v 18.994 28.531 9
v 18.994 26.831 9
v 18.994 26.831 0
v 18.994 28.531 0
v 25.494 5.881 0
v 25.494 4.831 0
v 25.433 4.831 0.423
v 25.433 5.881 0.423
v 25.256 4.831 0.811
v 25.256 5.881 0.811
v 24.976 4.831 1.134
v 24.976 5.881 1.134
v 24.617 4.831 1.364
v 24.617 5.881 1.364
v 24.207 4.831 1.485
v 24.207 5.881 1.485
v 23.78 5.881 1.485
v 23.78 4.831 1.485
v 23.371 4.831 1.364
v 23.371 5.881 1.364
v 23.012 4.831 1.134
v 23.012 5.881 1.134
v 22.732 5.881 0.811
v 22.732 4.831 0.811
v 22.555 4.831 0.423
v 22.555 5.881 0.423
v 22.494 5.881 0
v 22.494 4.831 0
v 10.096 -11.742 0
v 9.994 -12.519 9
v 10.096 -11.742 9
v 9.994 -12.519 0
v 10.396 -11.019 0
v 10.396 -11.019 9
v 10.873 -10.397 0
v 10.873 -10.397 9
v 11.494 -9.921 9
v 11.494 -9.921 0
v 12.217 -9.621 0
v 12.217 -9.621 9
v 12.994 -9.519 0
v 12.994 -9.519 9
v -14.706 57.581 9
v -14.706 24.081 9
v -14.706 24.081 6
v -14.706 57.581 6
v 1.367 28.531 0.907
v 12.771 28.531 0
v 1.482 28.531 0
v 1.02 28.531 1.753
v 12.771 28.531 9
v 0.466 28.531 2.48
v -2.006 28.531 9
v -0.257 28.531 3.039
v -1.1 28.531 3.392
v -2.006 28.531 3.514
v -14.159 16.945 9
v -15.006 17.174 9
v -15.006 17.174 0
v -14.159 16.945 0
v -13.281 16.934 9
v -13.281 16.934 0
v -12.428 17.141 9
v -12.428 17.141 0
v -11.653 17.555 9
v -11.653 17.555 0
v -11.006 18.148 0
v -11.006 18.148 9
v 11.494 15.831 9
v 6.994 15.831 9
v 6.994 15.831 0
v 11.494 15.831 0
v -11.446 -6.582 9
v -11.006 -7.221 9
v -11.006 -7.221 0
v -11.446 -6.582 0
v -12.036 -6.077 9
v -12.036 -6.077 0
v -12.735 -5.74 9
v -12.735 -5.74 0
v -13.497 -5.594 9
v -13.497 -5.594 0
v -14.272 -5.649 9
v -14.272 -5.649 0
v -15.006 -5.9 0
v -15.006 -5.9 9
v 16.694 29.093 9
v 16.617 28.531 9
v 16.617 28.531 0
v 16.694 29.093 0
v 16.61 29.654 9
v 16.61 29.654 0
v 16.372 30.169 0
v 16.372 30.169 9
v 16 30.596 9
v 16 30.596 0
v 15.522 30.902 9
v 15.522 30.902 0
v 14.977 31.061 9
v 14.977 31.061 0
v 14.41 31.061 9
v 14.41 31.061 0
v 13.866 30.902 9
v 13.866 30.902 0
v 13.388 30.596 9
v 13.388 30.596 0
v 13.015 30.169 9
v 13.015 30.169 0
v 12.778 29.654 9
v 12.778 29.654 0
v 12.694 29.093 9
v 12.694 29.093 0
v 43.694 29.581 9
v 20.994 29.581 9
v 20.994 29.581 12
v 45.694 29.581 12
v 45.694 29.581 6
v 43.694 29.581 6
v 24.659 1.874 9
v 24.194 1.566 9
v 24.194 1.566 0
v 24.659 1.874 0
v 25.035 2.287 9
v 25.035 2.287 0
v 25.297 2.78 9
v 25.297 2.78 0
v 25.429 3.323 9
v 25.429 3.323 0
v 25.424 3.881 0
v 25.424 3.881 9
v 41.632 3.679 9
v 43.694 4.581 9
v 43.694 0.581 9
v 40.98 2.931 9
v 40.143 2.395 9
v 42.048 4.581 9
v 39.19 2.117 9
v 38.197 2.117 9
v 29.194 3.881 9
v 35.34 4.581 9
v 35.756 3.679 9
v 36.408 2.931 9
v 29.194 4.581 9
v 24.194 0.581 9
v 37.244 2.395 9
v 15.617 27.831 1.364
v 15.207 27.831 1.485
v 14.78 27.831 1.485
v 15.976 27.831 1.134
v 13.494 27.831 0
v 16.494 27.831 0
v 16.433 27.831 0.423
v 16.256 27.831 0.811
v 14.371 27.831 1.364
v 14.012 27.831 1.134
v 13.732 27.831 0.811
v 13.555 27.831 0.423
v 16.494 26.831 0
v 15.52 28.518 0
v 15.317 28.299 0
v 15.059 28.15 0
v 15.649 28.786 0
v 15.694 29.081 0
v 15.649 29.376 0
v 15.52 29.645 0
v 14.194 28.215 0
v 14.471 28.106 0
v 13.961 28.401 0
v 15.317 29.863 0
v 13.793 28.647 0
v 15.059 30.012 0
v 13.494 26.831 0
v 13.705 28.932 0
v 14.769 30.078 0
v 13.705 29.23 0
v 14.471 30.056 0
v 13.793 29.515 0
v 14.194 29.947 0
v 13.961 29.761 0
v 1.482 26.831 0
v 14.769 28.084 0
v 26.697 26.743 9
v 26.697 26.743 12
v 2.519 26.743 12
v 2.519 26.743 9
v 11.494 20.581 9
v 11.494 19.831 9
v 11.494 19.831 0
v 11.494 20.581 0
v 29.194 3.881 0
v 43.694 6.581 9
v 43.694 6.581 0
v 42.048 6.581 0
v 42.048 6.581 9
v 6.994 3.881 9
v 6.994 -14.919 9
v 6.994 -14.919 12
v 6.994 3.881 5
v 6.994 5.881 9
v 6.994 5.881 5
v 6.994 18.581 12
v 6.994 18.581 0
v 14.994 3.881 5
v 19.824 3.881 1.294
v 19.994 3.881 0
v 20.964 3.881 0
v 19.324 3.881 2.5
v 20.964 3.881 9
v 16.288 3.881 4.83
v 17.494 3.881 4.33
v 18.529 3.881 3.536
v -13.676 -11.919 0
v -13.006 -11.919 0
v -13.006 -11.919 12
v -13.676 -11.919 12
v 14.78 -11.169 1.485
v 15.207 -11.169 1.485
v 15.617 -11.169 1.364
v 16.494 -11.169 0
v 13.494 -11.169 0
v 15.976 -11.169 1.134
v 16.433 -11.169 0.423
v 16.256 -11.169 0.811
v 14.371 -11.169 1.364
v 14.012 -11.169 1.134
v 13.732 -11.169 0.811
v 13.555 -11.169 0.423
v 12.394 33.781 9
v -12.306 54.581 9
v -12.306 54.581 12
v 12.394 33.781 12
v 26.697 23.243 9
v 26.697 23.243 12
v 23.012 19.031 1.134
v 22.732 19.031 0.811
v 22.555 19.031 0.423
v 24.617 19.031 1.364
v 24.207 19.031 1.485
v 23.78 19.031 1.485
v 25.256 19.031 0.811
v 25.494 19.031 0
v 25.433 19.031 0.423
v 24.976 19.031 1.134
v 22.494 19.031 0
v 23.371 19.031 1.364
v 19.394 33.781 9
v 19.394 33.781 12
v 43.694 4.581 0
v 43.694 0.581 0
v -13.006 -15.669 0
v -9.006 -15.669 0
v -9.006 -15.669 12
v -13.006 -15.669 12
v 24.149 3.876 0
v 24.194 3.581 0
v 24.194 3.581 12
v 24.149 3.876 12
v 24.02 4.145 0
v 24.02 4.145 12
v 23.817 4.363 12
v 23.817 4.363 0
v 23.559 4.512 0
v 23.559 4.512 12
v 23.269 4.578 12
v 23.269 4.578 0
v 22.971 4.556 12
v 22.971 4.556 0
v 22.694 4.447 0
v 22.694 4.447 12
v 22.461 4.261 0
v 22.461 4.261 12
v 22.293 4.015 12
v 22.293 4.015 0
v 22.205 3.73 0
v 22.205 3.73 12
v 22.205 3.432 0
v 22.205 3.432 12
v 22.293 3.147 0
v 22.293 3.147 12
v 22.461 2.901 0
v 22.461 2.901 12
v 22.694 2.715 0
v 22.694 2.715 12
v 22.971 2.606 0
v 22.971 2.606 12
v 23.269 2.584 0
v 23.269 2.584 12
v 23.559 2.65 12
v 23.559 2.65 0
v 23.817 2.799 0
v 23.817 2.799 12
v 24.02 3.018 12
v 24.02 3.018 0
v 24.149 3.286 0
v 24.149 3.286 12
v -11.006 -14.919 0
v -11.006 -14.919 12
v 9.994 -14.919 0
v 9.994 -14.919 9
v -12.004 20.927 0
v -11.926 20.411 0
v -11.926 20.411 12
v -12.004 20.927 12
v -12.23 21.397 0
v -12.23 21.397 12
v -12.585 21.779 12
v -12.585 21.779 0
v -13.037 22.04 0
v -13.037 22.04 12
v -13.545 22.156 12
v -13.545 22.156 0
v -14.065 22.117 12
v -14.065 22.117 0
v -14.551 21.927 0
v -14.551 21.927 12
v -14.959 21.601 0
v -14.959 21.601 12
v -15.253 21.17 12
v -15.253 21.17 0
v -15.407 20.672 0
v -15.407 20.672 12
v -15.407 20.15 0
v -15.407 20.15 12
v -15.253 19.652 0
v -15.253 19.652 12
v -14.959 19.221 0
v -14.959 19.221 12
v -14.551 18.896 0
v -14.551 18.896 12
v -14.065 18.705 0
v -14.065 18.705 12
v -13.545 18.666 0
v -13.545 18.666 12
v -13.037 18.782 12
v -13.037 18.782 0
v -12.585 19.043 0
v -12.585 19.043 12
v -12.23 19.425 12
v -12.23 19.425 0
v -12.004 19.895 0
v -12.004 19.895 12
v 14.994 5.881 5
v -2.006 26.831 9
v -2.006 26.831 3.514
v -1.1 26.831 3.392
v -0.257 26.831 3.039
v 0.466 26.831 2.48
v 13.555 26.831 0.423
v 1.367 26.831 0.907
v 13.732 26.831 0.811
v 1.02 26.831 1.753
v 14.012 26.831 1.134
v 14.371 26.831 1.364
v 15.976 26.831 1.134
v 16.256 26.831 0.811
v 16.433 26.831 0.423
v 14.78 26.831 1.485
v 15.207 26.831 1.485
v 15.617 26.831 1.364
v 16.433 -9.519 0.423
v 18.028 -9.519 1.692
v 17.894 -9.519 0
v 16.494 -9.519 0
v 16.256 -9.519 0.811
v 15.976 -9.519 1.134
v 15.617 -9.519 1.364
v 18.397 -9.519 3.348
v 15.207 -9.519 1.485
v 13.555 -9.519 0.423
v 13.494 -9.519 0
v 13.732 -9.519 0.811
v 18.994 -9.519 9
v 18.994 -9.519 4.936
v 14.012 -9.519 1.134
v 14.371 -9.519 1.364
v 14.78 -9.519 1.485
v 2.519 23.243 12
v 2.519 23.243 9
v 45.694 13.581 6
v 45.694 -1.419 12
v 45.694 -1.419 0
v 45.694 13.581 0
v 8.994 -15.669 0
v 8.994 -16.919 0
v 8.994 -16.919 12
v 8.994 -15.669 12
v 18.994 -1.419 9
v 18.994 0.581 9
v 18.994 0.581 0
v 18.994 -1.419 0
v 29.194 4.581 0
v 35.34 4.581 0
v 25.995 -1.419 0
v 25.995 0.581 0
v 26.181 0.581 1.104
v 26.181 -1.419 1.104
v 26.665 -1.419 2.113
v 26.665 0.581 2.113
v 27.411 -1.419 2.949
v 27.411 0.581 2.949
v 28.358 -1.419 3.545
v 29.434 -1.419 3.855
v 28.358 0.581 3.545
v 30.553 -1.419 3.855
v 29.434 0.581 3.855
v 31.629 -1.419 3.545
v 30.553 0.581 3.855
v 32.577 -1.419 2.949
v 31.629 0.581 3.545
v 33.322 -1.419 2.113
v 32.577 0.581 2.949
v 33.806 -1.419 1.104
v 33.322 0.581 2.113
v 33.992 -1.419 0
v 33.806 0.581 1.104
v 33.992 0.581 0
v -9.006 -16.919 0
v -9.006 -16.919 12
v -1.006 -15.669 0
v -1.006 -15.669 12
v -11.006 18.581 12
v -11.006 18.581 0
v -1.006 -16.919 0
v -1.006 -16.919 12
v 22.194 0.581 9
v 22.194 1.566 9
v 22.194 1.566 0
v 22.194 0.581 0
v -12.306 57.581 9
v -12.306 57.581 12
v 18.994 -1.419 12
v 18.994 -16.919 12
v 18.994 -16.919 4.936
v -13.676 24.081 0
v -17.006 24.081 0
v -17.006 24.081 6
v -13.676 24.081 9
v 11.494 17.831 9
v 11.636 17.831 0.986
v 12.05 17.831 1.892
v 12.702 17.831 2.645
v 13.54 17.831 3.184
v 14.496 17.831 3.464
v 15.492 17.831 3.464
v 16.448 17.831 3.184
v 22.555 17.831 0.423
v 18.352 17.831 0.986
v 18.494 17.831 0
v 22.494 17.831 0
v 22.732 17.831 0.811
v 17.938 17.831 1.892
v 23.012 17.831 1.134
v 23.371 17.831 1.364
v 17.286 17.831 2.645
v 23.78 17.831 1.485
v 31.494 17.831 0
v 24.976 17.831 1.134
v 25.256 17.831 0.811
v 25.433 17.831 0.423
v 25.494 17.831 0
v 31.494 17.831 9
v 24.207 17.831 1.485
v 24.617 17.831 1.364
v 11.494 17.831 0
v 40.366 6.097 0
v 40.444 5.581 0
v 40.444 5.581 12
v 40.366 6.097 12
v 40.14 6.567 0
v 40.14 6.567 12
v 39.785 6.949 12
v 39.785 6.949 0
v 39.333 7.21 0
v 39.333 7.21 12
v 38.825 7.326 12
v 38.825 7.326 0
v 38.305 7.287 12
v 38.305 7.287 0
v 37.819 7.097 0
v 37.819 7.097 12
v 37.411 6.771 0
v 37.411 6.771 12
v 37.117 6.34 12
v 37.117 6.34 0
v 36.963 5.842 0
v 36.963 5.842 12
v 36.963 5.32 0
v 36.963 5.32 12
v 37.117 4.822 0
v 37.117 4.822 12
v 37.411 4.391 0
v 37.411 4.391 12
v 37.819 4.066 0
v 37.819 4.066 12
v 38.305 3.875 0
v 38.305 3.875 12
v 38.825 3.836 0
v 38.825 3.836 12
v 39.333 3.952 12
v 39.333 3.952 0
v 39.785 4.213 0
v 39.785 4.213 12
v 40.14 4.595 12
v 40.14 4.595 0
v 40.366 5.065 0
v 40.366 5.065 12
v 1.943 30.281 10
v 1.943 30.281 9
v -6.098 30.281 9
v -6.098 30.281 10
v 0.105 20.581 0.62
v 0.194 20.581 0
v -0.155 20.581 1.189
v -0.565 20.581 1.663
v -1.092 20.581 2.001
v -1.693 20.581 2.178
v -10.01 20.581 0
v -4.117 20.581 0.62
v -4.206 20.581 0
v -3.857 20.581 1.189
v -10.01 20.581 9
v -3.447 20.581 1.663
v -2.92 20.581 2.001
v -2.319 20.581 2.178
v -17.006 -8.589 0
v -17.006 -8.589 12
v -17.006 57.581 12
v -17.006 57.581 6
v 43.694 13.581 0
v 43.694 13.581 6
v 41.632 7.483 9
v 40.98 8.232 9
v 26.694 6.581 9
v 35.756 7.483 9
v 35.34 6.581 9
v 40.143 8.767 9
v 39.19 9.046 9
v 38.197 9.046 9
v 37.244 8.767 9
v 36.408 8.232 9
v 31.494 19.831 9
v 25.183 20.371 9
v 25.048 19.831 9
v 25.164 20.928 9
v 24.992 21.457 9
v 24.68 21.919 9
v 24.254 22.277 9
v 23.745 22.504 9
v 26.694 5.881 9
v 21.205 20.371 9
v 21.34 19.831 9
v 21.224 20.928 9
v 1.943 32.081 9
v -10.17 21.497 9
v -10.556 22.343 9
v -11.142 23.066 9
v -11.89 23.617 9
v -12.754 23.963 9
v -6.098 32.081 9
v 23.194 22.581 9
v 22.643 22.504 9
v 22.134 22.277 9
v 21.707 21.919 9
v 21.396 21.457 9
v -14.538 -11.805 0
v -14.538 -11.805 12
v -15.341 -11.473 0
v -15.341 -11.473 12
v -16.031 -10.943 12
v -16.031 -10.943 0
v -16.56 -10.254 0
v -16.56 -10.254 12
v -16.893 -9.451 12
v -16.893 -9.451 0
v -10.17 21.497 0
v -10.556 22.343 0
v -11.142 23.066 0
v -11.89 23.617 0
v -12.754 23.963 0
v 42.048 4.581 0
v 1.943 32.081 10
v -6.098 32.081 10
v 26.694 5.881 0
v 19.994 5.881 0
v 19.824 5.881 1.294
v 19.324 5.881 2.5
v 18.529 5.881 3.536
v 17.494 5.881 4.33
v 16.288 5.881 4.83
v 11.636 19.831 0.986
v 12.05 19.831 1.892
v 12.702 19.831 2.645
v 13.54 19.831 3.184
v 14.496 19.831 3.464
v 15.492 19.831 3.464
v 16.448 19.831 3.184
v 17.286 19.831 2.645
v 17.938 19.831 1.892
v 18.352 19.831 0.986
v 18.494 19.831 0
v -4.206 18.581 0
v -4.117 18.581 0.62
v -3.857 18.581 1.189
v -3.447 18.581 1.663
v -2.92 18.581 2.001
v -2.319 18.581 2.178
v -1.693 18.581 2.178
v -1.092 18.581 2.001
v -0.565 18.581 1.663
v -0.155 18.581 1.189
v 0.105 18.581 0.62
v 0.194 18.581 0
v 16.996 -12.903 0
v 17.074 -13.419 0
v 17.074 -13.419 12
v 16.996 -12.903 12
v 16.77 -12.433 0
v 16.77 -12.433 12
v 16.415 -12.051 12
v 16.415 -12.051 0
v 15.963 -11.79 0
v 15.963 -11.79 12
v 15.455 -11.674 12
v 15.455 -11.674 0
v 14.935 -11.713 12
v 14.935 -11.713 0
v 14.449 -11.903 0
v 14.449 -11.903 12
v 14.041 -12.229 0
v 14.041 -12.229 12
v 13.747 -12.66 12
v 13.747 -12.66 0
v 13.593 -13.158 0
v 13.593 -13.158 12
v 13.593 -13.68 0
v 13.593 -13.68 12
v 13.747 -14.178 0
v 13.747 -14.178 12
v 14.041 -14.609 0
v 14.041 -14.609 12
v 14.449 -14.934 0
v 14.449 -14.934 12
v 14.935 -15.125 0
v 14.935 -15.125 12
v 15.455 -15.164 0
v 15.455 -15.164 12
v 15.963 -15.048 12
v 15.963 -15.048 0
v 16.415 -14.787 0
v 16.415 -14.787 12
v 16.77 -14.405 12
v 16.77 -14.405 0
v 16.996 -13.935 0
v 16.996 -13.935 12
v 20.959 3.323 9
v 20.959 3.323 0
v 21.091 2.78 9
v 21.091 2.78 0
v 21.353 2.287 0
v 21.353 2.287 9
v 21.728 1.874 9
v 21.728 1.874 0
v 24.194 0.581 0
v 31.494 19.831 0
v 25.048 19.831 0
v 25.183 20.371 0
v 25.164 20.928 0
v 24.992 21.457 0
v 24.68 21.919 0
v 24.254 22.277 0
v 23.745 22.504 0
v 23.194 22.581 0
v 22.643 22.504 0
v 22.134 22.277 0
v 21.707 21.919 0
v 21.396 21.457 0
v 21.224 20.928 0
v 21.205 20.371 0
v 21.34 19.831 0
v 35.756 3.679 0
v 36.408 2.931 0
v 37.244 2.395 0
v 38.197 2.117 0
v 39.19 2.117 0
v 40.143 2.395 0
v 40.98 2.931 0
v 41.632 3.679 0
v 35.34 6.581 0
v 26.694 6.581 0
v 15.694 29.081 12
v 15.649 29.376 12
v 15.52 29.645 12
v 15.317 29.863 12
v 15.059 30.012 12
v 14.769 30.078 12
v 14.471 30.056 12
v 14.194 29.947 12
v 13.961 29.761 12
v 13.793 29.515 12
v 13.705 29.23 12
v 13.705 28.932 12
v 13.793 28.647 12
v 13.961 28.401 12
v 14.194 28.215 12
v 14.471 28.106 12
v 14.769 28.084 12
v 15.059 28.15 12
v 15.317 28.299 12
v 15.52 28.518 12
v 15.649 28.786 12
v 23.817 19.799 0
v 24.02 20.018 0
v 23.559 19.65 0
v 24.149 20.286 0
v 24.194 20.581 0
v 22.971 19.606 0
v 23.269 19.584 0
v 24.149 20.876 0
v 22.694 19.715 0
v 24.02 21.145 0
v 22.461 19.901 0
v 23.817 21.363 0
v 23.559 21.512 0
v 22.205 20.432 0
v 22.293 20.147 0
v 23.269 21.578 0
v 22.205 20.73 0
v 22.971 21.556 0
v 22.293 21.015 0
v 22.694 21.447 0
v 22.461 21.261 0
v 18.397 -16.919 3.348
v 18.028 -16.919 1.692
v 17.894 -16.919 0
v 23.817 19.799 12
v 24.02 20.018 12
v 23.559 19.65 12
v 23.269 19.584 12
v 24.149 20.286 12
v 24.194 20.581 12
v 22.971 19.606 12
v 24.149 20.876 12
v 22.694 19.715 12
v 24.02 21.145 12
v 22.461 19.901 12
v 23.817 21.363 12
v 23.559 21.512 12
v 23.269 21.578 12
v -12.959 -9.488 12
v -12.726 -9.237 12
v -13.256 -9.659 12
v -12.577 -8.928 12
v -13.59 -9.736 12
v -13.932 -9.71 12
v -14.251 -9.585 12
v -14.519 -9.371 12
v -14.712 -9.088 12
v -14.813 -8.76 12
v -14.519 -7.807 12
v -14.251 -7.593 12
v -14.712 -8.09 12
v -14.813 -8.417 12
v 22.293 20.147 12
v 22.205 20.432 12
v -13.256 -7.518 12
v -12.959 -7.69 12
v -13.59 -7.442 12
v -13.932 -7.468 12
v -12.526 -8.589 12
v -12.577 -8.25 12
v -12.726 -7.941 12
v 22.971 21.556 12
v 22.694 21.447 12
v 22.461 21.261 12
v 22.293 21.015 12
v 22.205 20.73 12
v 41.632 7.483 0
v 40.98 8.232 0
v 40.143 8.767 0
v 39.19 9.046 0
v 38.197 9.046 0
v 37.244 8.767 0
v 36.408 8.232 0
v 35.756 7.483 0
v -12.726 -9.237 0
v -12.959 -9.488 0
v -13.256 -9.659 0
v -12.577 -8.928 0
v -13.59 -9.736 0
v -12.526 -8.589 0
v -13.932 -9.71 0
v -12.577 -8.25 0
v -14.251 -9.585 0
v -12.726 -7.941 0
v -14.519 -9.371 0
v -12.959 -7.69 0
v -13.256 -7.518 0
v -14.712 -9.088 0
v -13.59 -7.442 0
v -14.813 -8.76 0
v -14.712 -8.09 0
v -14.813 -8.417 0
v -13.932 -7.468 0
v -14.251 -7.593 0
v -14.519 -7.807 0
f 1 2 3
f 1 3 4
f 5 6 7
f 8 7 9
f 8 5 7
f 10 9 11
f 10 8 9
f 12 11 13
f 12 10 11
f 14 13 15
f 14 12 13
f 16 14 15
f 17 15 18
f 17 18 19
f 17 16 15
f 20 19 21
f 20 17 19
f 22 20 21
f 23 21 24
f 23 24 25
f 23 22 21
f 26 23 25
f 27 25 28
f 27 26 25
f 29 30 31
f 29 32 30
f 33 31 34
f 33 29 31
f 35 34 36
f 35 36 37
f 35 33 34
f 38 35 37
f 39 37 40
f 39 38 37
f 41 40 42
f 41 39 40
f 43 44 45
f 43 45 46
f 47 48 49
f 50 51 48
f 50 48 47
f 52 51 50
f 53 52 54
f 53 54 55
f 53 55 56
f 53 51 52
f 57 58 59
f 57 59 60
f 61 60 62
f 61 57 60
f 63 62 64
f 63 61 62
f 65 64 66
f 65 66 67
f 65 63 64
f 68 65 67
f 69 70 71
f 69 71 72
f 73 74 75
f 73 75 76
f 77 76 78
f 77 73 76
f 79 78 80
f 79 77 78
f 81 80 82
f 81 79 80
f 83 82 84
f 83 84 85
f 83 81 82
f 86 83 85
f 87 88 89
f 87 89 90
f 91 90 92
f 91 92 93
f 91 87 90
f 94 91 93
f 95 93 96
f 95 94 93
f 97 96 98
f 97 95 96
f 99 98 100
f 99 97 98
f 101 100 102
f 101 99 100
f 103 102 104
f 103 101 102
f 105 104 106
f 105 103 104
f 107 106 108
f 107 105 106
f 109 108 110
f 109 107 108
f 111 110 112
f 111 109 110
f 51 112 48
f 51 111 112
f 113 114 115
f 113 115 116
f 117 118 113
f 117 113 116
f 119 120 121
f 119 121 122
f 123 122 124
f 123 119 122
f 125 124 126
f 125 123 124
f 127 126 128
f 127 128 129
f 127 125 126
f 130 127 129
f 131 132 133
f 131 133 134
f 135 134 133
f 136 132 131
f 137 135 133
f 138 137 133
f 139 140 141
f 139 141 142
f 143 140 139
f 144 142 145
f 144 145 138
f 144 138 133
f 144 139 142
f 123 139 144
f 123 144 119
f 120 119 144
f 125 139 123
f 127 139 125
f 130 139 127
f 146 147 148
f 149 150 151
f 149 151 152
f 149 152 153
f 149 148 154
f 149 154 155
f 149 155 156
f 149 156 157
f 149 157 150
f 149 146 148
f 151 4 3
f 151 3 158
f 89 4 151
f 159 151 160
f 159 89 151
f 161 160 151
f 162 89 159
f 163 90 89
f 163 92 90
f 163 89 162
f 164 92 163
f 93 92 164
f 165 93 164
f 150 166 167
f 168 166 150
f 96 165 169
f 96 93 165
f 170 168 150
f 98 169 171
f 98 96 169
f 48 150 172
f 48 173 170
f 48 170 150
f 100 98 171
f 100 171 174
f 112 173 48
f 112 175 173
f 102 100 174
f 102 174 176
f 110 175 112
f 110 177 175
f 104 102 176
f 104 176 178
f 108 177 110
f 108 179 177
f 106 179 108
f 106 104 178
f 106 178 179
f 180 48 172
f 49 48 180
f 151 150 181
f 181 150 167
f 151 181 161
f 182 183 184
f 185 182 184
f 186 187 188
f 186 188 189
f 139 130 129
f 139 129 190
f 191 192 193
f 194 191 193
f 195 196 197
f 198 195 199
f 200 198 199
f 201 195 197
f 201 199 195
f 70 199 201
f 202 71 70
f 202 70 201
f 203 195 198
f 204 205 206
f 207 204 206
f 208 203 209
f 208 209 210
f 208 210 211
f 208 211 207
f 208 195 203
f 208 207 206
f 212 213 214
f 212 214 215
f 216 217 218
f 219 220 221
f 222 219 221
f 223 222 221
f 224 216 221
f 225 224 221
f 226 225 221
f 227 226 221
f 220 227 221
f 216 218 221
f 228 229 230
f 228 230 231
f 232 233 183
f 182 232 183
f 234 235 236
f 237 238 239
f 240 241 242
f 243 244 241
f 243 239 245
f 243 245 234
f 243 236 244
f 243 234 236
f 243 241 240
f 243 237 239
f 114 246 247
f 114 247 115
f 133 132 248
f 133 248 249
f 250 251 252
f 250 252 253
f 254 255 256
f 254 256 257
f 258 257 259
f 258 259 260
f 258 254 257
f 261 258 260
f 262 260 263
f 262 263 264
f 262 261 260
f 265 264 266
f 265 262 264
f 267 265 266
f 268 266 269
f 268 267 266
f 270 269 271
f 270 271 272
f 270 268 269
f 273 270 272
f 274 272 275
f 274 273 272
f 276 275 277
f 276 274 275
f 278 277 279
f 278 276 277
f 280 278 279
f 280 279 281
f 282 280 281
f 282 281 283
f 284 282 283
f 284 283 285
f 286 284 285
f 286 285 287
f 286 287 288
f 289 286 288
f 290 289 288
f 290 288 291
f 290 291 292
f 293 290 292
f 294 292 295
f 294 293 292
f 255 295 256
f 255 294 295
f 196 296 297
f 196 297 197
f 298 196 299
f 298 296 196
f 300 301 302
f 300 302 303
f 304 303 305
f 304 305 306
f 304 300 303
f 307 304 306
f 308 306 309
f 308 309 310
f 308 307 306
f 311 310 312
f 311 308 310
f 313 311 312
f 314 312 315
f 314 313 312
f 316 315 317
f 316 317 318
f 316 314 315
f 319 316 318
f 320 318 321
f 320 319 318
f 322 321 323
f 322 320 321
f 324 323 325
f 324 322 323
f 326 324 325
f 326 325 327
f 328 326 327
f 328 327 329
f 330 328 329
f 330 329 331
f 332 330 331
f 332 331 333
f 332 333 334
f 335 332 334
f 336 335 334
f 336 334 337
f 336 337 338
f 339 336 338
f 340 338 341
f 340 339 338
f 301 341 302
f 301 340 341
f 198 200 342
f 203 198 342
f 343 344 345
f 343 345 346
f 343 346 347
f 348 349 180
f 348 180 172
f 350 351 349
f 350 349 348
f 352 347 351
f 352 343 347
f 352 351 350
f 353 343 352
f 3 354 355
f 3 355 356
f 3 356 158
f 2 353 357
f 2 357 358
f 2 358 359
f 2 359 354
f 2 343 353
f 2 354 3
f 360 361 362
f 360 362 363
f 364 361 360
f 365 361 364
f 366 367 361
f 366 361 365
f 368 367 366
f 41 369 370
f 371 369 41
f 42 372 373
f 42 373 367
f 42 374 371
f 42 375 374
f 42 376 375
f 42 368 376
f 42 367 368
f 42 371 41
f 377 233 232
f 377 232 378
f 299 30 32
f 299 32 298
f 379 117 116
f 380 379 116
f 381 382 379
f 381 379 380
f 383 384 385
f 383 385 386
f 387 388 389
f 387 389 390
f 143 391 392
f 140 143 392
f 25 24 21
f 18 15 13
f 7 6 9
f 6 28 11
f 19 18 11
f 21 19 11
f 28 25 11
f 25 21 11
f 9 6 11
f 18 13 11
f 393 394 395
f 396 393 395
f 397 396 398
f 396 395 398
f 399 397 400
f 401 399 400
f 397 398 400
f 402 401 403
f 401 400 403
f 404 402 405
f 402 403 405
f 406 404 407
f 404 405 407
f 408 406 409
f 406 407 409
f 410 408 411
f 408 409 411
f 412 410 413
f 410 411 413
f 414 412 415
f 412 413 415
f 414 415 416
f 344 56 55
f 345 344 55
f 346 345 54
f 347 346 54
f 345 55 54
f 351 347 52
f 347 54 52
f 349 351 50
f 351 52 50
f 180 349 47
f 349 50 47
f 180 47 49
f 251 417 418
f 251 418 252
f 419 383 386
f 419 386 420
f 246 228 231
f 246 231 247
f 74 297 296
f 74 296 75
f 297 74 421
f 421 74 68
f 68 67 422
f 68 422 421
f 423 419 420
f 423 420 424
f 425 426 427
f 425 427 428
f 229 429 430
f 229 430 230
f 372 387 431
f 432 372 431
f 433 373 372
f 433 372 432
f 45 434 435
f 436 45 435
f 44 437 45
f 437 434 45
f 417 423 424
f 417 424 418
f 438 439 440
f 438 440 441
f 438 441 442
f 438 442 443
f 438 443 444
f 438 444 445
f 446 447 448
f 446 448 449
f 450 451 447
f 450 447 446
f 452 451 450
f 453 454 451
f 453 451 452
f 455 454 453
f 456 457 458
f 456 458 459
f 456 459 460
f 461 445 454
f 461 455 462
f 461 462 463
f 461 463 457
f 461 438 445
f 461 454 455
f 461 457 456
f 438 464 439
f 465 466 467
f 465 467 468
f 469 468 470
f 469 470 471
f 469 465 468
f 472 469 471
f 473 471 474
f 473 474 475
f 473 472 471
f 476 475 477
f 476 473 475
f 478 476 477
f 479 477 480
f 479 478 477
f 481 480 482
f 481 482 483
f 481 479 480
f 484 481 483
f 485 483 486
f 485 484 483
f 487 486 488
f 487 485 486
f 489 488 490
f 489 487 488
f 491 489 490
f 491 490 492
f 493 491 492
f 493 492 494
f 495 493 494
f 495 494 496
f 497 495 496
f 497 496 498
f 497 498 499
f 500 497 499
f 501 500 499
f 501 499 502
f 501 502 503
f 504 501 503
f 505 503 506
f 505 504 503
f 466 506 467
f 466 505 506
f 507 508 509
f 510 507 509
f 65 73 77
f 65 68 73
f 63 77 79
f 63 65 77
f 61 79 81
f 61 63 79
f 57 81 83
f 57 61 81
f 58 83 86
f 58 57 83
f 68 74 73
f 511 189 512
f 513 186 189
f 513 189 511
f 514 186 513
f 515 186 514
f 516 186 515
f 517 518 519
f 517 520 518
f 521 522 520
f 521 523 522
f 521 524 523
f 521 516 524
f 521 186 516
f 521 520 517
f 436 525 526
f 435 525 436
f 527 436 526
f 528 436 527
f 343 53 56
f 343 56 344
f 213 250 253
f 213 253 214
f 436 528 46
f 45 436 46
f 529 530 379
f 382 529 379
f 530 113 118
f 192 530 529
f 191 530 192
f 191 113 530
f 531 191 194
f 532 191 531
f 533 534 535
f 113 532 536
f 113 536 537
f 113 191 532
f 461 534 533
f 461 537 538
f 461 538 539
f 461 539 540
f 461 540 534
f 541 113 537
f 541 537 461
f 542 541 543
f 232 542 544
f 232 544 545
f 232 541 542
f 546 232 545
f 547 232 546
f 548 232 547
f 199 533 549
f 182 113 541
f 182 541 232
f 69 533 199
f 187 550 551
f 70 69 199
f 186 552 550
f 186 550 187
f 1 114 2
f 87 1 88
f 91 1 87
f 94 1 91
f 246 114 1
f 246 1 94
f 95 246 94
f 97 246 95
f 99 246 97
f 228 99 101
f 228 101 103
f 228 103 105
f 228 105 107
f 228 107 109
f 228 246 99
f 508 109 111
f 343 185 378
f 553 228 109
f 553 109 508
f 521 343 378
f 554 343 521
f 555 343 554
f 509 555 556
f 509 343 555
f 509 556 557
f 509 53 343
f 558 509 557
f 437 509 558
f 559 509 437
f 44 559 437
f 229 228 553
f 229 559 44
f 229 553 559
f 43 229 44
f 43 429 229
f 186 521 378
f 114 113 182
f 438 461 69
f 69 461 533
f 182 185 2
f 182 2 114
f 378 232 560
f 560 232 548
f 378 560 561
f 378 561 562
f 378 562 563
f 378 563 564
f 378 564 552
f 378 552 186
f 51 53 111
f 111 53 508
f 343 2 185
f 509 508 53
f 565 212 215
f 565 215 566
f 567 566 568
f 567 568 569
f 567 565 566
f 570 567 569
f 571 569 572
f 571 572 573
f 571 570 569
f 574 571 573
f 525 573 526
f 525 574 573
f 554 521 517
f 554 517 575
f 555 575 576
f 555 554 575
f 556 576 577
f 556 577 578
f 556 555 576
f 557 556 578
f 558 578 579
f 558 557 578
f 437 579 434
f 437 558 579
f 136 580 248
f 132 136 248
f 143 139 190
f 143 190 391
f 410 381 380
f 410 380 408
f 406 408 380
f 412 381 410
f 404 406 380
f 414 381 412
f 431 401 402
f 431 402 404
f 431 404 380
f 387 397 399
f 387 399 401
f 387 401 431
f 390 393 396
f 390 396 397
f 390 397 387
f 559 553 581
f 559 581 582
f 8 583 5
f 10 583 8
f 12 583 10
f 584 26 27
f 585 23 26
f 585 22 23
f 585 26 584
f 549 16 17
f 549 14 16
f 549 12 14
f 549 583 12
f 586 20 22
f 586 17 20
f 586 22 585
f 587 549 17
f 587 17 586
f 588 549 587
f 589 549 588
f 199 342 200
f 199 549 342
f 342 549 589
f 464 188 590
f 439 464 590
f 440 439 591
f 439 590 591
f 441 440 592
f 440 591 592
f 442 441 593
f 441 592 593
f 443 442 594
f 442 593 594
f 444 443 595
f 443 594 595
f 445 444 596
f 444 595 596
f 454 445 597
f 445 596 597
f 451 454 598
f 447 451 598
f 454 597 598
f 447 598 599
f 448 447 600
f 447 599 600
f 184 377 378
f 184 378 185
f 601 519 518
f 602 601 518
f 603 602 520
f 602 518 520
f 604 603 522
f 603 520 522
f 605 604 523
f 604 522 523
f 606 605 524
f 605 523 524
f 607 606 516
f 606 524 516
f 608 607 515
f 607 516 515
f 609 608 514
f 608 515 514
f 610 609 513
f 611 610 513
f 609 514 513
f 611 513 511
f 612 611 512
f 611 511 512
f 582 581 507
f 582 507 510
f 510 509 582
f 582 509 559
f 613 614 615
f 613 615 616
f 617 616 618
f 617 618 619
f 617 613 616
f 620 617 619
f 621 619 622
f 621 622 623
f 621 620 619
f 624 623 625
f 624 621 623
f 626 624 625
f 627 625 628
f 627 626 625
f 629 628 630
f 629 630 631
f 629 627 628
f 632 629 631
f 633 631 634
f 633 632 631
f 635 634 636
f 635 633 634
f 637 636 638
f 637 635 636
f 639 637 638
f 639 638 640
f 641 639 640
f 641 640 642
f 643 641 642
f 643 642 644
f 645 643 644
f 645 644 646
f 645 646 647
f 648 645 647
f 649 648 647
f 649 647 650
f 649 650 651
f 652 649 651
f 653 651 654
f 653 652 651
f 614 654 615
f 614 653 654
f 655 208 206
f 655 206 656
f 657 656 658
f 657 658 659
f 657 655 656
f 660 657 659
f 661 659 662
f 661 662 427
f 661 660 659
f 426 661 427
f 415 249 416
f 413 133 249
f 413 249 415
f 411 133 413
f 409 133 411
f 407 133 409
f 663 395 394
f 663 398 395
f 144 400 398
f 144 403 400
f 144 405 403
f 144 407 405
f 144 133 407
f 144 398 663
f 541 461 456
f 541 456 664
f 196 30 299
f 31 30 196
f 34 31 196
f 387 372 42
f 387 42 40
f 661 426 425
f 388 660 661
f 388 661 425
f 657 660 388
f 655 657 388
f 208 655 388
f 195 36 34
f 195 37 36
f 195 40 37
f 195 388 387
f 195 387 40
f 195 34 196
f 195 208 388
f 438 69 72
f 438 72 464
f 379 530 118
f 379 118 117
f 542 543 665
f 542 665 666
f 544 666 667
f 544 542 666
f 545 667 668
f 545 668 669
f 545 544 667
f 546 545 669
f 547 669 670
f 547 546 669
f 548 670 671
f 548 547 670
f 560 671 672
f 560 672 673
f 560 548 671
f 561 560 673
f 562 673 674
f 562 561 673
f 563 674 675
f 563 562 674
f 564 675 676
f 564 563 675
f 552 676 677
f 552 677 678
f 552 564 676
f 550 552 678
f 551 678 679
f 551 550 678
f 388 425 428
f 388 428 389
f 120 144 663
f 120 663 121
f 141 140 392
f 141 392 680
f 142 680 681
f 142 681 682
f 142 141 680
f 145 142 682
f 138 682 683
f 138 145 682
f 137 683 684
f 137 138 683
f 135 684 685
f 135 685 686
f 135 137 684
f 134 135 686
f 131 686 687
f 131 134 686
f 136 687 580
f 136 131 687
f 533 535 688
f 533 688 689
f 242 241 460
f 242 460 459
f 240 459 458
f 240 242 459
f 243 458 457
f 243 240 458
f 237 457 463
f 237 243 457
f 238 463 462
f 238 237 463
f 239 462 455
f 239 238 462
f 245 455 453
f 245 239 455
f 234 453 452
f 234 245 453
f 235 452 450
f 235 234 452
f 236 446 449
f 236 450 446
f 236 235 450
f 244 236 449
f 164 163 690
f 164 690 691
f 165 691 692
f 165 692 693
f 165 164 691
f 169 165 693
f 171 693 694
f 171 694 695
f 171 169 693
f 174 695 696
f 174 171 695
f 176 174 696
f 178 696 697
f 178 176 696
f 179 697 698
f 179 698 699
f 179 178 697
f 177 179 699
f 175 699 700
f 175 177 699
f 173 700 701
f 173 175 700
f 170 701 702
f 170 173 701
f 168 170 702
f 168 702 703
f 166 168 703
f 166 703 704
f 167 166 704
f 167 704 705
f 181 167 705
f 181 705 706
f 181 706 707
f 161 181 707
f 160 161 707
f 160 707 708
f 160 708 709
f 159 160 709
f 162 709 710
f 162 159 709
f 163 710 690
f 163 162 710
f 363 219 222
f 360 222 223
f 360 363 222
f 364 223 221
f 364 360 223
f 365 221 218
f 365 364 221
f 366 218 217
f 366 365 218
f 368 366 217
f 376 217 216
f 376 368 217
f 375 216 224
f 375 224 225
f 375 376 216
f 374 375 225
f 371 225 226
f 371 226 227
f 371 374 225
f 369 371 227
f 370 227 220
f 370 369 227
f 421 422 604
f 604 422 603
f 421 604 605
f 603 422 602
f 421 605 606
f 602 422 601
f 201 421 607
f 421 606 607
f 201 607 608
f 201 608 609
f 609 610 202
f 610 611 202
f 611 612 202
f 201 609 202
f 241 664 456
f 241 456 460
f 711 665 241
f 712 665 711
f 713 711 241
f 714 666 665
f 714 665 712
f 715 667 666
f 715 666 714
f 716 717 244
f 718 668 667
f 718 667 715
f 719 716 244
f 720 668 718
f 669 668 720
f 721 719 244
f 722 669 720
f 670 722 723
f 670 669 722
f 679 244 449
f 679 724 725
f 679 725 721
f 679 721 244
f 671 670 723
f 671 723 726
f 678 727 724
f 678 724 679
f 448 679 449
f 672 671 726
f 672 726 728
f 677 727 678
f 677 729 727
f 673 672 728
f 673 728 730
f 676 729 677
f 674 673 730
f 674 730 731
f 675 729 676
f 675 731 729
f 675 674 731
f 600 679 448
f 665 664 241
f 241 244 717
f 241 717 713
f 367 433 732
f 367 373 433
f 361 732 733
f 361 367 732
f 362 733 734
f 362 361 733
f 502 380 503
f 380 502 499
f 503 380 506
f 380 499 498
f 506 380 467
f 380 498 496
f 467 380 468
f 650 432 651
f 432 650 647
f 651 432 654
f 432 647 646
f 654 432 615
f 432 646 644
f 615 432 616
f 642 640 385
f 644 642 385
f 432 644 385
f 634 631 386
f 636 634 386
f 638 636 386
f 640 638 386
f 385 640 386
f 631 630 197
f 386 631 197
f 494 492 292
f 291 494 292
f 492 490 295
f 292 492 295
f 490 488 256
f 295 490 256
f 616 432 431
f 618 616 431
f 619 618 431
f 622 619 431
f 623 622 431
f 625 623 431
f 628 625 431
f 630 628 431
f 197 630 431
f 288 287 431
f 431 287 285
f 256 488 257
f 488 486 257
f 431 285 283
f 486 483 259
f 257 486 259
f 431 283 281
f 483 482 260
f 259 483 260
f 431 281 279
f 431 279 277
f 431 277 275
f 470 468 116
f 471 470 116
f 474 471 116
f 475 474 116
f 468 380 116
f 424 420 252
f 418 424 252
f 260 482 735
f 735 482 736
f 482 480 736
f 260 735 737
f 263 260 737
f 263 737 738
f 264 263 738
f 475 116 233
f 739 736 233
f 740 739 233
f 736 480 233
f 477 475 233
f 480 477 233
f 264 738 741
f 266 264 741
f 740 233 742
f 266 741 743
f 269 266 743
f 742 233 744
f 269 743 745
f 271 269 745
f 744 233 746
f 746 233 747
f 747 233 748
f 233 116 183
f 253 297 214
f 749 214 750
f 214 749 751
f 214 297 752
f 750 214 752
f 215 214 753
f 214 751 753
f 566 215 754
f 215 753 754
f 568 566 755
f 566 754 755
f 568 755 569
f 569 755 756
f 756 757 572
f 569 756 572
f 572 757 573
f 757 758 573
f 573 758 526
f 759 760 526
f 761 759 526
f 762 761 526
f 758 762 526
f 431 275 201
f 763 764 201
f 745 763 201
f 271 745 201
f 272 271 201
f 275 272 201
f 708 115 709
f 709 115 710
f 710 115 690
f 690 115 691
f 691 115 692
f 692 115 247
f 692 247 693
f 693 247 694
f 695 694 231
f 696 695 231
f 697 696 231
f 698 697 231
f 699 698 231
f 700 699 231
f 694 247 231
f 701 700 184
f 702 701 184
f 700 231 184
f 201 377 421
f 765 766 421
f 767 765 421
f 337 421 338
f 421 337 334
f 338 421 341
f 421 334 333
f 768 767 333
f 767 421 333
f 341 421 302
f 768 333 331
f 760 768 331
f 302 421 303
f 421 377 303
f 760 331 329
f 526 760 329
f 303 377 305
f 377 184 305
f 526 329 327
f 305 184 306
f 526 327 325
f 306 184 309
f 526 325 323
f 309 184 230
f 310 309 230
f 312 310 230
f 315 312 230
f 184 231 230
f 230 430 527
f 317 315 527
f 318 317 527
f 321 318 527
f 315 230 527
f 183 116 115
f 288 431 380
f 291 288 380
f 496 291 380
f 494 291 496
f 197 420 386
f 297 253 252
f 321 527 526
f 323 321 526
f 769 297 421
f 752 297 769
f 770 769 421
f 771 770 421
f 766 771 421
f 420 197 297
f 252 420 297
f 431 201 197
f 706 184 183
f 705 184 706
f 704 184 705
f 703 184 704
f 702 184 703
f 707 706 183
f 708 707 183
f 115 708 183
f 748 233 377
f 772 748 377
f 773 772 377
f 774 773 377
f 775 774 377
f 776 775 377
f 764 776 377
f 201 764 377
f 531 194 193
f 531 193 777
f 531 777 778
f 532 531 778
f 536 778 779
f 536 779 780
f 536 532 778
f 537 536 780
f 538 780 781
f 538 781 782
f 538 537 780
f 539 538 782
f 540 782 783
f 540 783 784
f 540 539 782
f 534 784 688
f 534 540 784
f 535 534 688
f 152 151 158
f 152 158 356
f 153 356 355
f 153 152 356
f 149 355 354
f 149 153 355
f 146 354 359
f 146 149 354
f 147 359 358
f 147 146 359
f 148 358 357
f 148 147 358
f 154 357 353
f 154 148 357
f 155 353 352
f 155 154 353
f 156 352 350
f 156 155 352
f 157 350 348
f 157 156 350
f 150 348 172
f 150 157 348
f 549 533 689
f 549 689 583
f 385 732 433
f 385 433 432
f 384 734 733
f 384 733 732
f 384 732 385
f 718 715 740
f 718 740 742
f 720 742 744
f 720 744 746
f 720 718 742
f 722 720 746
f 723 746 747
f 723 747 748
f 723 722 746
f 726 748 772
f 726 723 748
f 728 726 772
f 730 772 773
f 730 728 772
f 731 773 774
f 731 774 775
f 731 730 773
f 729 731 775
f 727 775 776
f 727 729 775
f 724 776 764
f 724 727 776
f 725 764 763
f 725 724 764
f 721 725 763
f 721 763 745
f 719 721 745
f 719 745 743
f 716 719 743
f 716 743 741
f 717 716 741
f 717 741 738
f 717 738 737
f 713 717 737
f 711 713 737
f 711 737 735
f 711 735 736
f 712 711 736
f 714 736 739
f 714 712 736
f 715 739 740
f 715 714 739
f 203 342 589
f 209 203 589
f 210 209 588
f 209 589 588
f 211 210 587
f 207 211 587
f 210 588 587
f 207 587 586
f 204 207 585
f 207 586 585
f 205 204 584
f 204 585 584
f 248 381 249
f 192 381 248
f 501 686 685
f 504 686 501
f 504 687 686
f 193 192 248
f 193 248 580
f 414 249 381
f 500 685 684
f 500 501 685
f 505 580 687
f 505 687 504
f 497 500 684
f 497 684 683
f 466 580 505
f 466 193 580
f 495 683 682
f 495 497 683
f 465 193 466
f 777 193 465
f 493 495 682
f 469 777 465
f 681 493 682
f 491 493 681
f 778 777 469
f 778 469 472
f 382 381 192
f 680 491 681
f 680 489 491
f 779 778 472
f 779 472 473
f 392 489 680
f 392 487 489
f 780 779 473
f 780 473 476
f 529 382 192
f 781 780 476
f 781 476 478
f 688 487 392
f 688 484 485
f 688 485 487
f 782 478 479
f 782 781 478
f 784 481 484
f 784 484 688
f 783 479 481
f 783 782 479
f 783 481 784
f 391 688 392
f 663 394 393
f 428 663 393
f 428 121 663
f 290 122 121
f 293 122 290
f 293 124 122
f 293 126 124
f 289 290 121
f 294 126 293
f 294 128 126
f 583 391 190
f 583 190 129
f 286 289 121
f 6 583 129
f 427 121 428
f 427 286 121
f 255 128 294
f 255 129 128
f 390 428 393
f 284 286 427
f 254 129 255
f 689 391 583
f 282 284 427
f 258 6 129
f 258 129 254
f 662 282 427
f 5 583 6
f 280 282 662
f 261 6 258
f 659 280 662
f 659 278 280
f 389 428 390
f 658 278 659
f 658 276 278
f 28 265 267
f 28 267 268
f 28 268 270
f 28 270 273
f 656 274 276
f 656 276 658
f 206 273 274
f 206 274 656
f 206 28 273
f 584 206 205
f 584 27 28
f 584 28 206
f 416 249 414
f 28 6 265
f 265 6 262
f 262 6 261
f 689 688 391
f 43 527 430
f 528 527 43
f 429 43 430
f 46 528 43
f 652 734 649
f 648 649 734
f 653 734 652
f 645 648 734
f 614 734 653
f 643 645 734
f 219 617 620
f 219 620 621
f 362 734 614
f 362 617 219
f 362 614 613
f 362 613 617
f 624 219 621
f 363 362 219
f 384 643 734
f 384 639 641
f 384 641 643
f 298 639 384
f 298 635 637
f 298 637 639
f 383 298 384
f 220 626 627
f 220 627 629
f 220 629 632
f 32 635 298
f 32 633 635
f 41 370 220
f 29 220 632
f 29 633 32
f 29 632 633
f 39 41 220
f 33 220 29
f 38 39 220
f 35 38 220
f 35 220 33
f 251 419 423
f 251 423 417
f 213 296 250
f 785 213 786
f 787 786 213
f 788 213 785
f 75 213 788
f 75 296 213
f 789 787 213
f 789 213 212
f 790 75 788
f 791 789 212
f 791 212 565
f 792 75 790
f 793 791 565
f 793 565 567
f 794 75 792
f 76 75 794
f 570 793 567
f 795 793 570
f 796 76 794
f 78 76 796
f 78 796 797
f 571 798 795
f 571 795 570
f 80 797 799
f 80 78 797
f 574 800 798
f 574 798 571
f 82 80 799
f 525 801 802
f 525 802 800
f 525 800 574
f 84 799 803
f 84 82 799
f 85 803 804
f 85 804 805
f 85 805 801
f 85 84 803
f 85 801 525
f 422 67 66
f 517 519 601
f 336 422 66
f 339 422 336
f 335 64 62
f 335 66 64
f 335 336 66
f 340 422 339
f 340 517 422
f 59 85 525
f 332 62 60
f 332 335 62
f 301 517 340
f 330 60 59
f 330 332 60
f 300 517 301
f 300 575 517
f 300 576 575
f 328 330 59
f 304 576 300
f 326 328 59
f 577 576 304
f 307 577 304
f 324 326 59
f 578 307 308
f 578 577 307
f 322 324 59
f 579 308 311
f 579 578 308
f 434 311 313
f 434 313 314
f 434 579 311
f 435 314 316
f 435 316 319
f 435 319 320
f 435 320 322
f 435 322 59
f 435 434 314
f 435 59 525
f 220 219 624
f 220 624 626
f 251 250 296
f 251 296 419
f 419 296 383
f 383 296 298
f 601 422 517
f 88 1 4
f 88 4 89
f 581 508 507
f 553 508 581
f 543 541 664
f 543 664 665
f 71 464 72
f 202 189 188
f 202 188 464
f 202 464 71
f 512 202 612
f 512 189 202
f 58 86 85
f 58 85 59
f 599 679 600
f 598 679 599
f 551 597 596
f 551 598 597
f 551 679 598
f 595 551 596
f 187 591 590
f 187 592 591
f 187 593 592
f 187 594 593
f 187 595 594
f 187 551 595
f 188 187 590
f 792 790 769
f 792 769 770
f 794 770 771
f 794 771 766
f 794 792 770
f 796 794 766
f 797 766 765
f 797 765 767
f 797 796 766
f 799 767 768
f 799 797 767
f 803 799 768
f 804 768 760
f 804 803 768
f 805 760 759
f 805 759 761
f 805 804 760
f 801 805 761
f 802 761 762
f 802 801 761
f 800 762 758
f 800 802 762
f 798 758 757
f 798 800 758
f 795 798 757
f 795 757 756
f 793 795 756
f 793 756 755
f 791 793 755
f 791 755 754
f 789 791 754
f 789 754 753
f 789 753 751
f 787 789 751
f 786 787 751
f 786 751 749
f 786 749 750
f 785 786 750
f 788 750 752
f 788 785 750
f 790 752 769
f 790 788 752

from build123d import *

# Parameters (mm, degrees)
ESQUISSE1_R                   = 1.15
ESQUISSE1_R_2                 = 1.75
ESQUISSE1_R_3                 = 1
ESQUISSE1_W                   = 18
ESQUISSE1_H                   = 33.5
BOSS_EXTRU_2_DEPTH            = 12
ENL_V_MAT_EXTRU_1_DEPTH       = 75.057589753
ESQUISSE3_W                   = 2.3
ESQUISSE3_H                   = 33.5
ESQUISSE3_W_2                 = 2
ESQUISSE3_H_2                 = 16
ENL_V_MAT_EXTRU_2_DEPTH       = 74.753146373
CONG_1_R                      = 3
ENL_V_MAT_EXTRU_3_REACH       = 62.317
ESQUISSE4_R                   = 2.2
ENL_V_MAT_EXTRU_4_REACH       = 67.556
ESQUISSE5_R                   = 3.5
ESQUISSE6_R                   = 3.5
ENL_V_MAT_EXTRU_5_DEPTH       = 5
ESQUISSE7_W                   = 8.040923999
ESQUISSE7_H                   = 1.8
ENL_V_MAT_EXTRU_6_DEPTH       = 1
ENL_V_MAT_EXTRU_7_DEPTH       = 3
ENL_V_MAT_EXTRU_7_DEPTH_BACK  = 75.185757393
ESQUISSE8_W                   = 24.177827552
ESQUISSE8_H                   = 3.5
ENL_V_MAT_EXTRU_8_REACH       = 72.034
ENL_V_MAT_EXTRU_9_REACH       = 76.033
ESQUISSE10_R                  = 4
ESQUISSE11_R                  = 12.099999999
ENL_V_MAT_EXTRU_10_DEPTH      = 76.583950893
ENL_V_MAT_EXTRU_11_DEPTH      = 38
ENL_V_MAT_EXTRU_11_DEPTH_BACK = 1
ESQUISSE17_R                  = 1.5
ENL_V_MAT_EXTRU_12_DEPTH      = 13
ENL_V_MAT_EXTRU_12_DEPTH_BACK = 1.2
ESQUISSE18_R                  = 1.5


with BuildPart() as part:
    # Esquisse1 → Boss.-Extru.2 (new body)
    with BuildSketch(Plane.XY):
        with BuildLine():
            Line((-12.306087575, 57.58118588), (-12.306087575, 54.58118588))
            Line((-12.306087575, 54.58118588), (12.393912425, 33.78118588))
            Line((12.393912425, 33.78118588), (19.393912425, 33.78118588))
            Line((19.393912425, 33.78118588), (20.993912425, 29.58118588))
            Line((20.993912425, 29.58118588), (45.693912425, 29.58118588))
            Line((45.693912425, 29.58118588), (45.693912425, -1.41881412))
            Line((45.693912425, -1.41881412), (18.993912425, -1.41881412))
            Line((18.993912425, -1.41881412), (18.993912425, -16.91881412))
            Line((18.993912425, -16.91881412), (8.993912425, -16.91881412))
            Line((8.993912425, -16.91881412), (8.993912425, -15.66881412))
            Line((8.993912425, -15.66881412), (-1.006087575, -15.66881412))
            Line((-1.006087575, -15.66881412), (-1.006087575, -16.91881412))
            Line((-1.006087575, -16.91881412), (-9.006087575, -16.91881412))
            Line((-9.006087575, -16.91881412), (-9.006087575, -15.66881412))
            Line((-9.006087575, -15.66881412), (-13.006087575, -15.66881412))
            Line((-13.006087575, -15.66881412), (-13.006087575, -11.91881412))
            Line((-13.006087575, -11.91881412), (-13.676087575, -11.91881412))
            ThreePointArc((-13.676087575, -11.91881412), (-16.030753157, -10.943479702), (-17.006087575, -8.58881412))
            Line((-17.006087575, -8.58881412), (-17.006087575, 57.58118588))
            Line((-17.006087575, 57.58118588), (-12.306087575, 57.58118588))
        make_face()
        with Locations((-13.676087575, -8.58881412)):
            Circle(ESQUISSE1_R, mode=Mode.SUBTRACT)
        with Locations((-13.676087575, 20.41118588)):
            Circle(ESQUISSE1_R_2, mode=Mode.SUBTRACT)
        with Locations((15.323912425, -13.41881412)):
            Circle(ESQUISSE1_R_2, mode=Mode.SUBTRACT)
        with Locations((38.693912425, 5.58118588)):
            Circle(ESQUISSE1_R_2, mode=Mode.SUBTRACT)
        with Locations((23.193912425, 3.58118588)):
            Circle(ESQUISSE1_R_3, mode=Mode.SUBTRACT)
        with Locations((23.193912425, 20.58118588)):
            Circle(ESQUISSE1_R_3, mode=Mode.SUBTRACT)
        with Locations((14.693912425, 29.08118588)):
            Circle(ESQUISSE1_R_3, mode=Mode.SUBTRACT)
        with Locations((-2.006087575, 1.83118588)):
            Rectangle(ESQUISSE1_W, ESQUISSE1_H, mode=Mode.SUBTRACT)
    extrude(amount=BOSS_EXTRU_2_DEPTH)

    # Esquisse2 → Enlèv. mat.-Extru.1 (cut, through all)
    # profile 1 of 4: a face of its own
    with BuildSketch(Plane.XY.offset(9)):
        with BuildLine():
            ThreePointArc((25.047962046, 19.83118588), (23.193912425, 22.58118588), (21.339862803, 19.83118588))
            Line((21.339862803, 19.83118588), (11.493912425, 19.83118588))
            Line((11.493912425, 19.83118588), (11.493912425, 20.58118588))
            Line((11.493912425, 20.58118588), (-10.010027019, 20.58118588))
            ThreePointArc((-10.010027019, 20.58118588), (-11.141822396, 23.065691483), (-13.676087575, 24.08118588))
            Line((-13.676087575, 24.08118588), (-14.706087575, 24.08118588))
            Line((-14.706087575, 24.08118588), (-14.706087575, 57.58118588))
            Line((-14.706087575, 57.58118588), (-12.306087575, 57.58118588))
            Line((-12.306087575, 57.58118588), (-12.306087575, 54.58118588))
            Line((-12.306087575, 54.58118588), (12.393912425, 33.78118588))
            Line((12.393912425, 33.78118588), (19.393912425, 33.78118588))
            Line((19.393912425, 33.78118588), (20.993912425, 29.58118588))
            Line((20.993912425, 29.58118588), (43.693912425, 29.58118588))
            Line((43.693912425, 29.58118588), (43.693912425, 6.58118588))
            Line((43.693912425, 6.58118588), (42.048014391, 6.58118588))
            ThreePointArc((42.048014391, 6.58118588), (38.693912425, 9.08118588), (35.339810458, 6.58118588))
            Line((35.339810458, 6.58118588), (26.693912425, 6.58118588))
            Line((26.693912425, 6.58118588), (26.693912425, 5.88118588))
            Line((26.693912425, 5.88118588), (6.993912425, 5.88118588))
            Line((6.993912425, 5.88118588), (6.993912425, 15.83118588))
            Line((6.993912425, 15.83118588), (11.493912425, 15.83118588))
            Line((11.493912425, 15.83118588), (11.493912425, 17.83118588))
            Line((11.493912425, 17.83118588), (31.493912425, 17.83118588))
            Line((31.493912425, 17.83118588), (31.493912425, 19.83118588))
            Line((31.493912425, 19.83118588), (25.047962046, 19.83118588))
        make_face()
        with BuildLine():
            ThreePointArc((16.616800877, 28.53118588), (14.693912425, 31.08118588), (12.771023972, 28.53118588))
            Line((12.771023972, 28.53118588), (-2.006087575, 28.53118588))
            Line((-2.006087575, 28.53118588), (-2.006087575, 26.83118588))
            Line((-2.006087575, 26.83118588), (18.993912425, 26.83118588))
            Line((18.993912425, 26.83118588), (18.993912425, 28.53118588))
            Line((18.993912425, 28.53118588), (16.616800877, 28.53118588))
        make_face(mode=Mode.SUBTRACT)
    # profile 2 of 4: a face of its own
    with BuildSketch(Plane.XY.offset(9)):
        with BuildLine():
            ThreePointArc((20.964002112, 3.88118588), (21.206819115, 2.52574276), (22.193912425, 1.565621443))
            Line((22.193912425, 1.565621443), (22.193912425, 0.58118588))
            Line((22.193912425, 0.58118588), (18.993912425, 0.58118588))
            Line((18.993912425, 0.58118588), (18.993912425, -9.51881412))
            Line((18.993912425, -9.51881412), (9.993912425, -9.51881412))
            Line((9.993912425, -9.51881412), (9.993912425, -14.91881412))
            Line((9.993912425, -14.91881412), (6.993912425, -14.91881412))
            Line((6.993912425, -14.91881412), (6.993912425, 3.88118588))
            Line((6.993912425, 3.88118588), (20.964002112, 3.88118588))
        make_face()
    # profile 3 of 4: a face of its own
    with BuildSketch(Plane.XY.offset(9)):
        with BuildLine():
            ThreePointArc((-15.006087575, 17.173733177), (-12.847657165, 17.010641356), (-11.006087575, 18.148201125))
            Line((-11.006087575, 18.148201125), (-11.006087575, -7.220932547))
            ThreePointArc((-11.006087575, -7.220932547), (-12.735191712, -5.740180242), (-15.006087575, -5.899743649))
            Line((-15.006087575, -5.899743649), (-15.006087575, 17.173733177))
        make_face()
    # profile 4 of 4: a face of its own
    with BuildSketch(Plane.XY.offset(9)):
        with BuildLine():
            ThreePointArc((24.193912425, 1.565621443), (25.181005734, 2.52574276), (25.423822737, 3.88118588))
            Line((25.423822737, 3.88118588), (29.193912425, 3.88118588))
            Line((29.193912425, 3.88118588), (29.193912425, 4.58118588))
            Line((29.193912425, 4.58118588), (35.339810458, 4.58118588))
            ThreePointArc((35.339810458, 4.58118588), (38.693912425, 2.08118588), (42.048014391, 4.58118588))
            Line((42.048014391, 4.58118588), (43.693912425, 4.58118588))
            Line((43.693912425, 4.58118588), (43.693912425, 0.58118588))
            Line((43.693912425, 0.58118588), (24.193912425, 0.58118588))
            Line((24.193912425, 0.58118588), (24.193912425, 1.565621443))
        make_face()
    extrude(amount=-ENL_V_MAT_EXTRU_1_DEPTH, mode=Mode.SUBTRACT)

    # Esquisse3 → Enlèv. mat.-Extru.2 (cut, through all)
    with BuildSketch(Plane.XY.offset(6)):
        with Locations((-15.856087575, 40.83118588)):
            Rectangle(ESQUISSE3_W, ESQUISSE3_H)
        with Locations((44.693912425, 21.58118588)):
            Rectangle(ESQUISSE3_W_2, ESQUISSE3_H_2)
    extrude(amount=-ENL_V_MAT_EXTRU_2_DEPTH, mode=Mode.SUBTRACT)

    # Congé1
    cong_1_edges = [part.edges().sort_by_distance(p)[0] for p in [
        (9.993912425, -9.51881412, 4.5),
    ]]
    fillet(cong_1_edges, radius=CONG_1_R)

    # Esquisse4 → Enlèv. mat.-Extru.3 (cut, up to next)
    with BuildSketch(Plane(origin=(0, 20.58118588, 0), x_dir=(1, 0, 0), z_dir=(0, 1, 0)), mode=Mode.PRIVATE) as enl_v_mat_extru_3_sk1:
        with Locations((-2.006087575, 0)):
            Circle(ESQUISSE4_R)
    enl_v_mat_extru_3_tool1 = extrude(enl_v_mat_extru_3_sk1.sketch, amount=-ENL_V_MAT_EXTRU_3_REACH, mode=Mode.PRIVATE) & part.part
    add(enl_v_mat_extru_3_tool1.solids().sort_by_distance((-2.006088, 20.581186, 0))[0], mode=Mode.SUBTRACT)

    # Esquisse5 → Enlèv. mat.-Extru.4 (cut, up to next)
    with BuildSketch(Plane(origin=(0, 28.53118588, 0), x_dir=(1, 0, 0), z_dir=(0, 1, 0)), mode=Mode.PRIVATE) as enl_v_mat_extru_4_sk1:
        with Locations((-2.017786304, -0.014313461)):
            Circle(ESQUISSE5_R)
    enl_v_mat_extru_4_tool1 = extrude(enl_v_mat_extru_4_sk1.sketch, amount=-ENL_V_MAT_EXTRU_4_REACH, mode=Mode.PRIVATE) & part.part
    add(enl_v_mat_extru_4_tool1.solids().sort_by_distance((-2.017786, 28.531186, 0.014313))[0], mode=Mode.SUBTRACT)

    # Esquisse6 → Enlèv. mat.-Extru.5 (cut)
    with BuildSketch(Plane(origin=(0, 19.83118588, 0), x_dir=(1, 0, 0), z_dir=(0, 1, 0))):
        with Locations((14.993912425, 0)):
            Circle(ESQUISSE6_R)
    extrude(amount=-ENL_V_MAT_EXTRU_5_DEPTH, mode=Mode.SUBTRACT)

    # Esquisse7 → Enlèv. mat.-Extru.6 (cut)
    with BuildSketch(Plane(origin=(0, 0, 9), x_dir=(-1, 0, 0), z_dir=(0, 0, -1))):
        with Locations((2.077482888, 31.18118588)):
            Rectangle(ESQUISSE7_W, ESQUISSE7_H)
    extrude(amount=-ENL_V_MAT_EXTRU_6_DEPTH, mode=Mode.SUBTRACT)

    # Esquisse8 → Enlèv. mat.-Extru.7 (cut, two sides: drawn at the far end of the back side and taken through both)
    with BuildSketch(Plane(origin=(0, 0, 10), x_dir=(-1, 0, 0), z_dir=(0, 0, -1)).offset(-ENL_V_MAT_EXTRU_7_DEPTH_BACK)):
        with Locations((-14.607691418, 24.992571009)):
            Rectangle(ESQUISSE8_W, ESQUISSE8_H)
    extrude(amount=ENL_V_MAT_EXTRU_7_DEPTH + ENL_V_MAT_EXTRU_7_DEPTH_BACK, mode=Mode.SUBTRACT)

    # Esquisse9 → Enlèv. mat.-Extru.8 (cut, up to next)
    with BuildSketch(Plane(origin=(0, 5.88118588, 0), x_dir=(1, 0, 0), z_dir=(0, 1, 0)), mode=Mode.PRIVATE) as enl_v_mat_extru_8_sk1:
        with BuildLine():
            Line((19.993912425, 0), (6.993912425, 0))
            Line((6.993912425, 0), (6.993912425, -5))
            Line((6.993912425, -5), (14.993912425, -5))
            ThreePointArc((14.993912425, -5), (18.529446331, -3.535533906), (19.993912425, 0))
        make_face()
    enl_v_mat_extru_8_tool1 = extrude(enl_v_mat_extru_8_sk1.sketch, amount=-ENL_V_MAT_EXTRU_8_REACH, mode=Mode.PRIVATE) & part.part
    add(enl_v_mat_extru_8_tool1.solids().sort_by_distance((13.009618, 5.881186, 2.375564))[0], mode=Mode.SUBTRACT)

    # Esquisse10 → Enlèv. mat.-Extru.9 (cut, up to next)
    with BuildSketch(Plane(origin=(0, 0.58118588, 0), x_dir=(1, 0, 0), z_dir=(0, 1, 0)), mode=Mode.PRIVATE) as enl_v_mat_extru_9_sk1:
        with Locations((29.993541661, 0.105464602)):
            Circle(ESQUISSE10_R)
    enl_v_mat_extru_9_tool1 = extrude(enl_v_mat_extru_9_sk1.sketch, amount=-ENL_V_MAT_EXTRU_9_REACH, mode=Mode.PRIVATE) & part.part
    add(enl_v_mat_extru_9_tool1.solids().sort_by_distance((29.993542, 0.581186, -0.105465))[0], mode=Mode.SUBTRACT)

    # Esquisse11 → Enlèv. mat.-Extru.10 (cut, through all)
    with BuildSketch(Plane.XZ.offset(1.41881412)):
        with Locations((29.993541661, -0.105464602)):
            Circle(ESQUISSE11_R)
    extrude(amount=ENL_V_MAT_EXTRU_10_DEPTH, mode=Mode.SUBTRACT)

    # Esquisse17 → Enlèv. mat.-Extru.11 (cut, two sides: drawn at the far end of the back side and taken through both)
    with BuildSketch(Plane.XZ.offset(-26.83118588).offset(-ENL_V_MAT_EXTRU_11_DEPTH_BACK)):
        with Locations((14.993912425, 0)):
            Circle(ESQUISSE17_R)
    extrude(amount=ENL_V_MAT_EXTRU_11_DEPTH + ENL_V_MAT_EXTRU_11_DEPTH_BACK, mode=Mode.SUBTRACT)

    # Esquisse18 → Enlèv. mat.-Extru.12 (cut, two sides: drawn at the far end of the back side and taken through both)
    with BuildSketch(Plane.XZ.offset(-17.83118588).offset(-ENL_V_MAT_EXTRU_12_DEPTH_BACK)):
        with Locations((23.993912425, 0)):
            Circle(ESQUISSE18_R)
    extrude(amount=ENL_V_MAT_EXTRU_12_DEPTH + ENL_V_MAT_EXTRU_12_DEPTH_BACK, mode=Mode.SUBTRACT)


solid = part.part
